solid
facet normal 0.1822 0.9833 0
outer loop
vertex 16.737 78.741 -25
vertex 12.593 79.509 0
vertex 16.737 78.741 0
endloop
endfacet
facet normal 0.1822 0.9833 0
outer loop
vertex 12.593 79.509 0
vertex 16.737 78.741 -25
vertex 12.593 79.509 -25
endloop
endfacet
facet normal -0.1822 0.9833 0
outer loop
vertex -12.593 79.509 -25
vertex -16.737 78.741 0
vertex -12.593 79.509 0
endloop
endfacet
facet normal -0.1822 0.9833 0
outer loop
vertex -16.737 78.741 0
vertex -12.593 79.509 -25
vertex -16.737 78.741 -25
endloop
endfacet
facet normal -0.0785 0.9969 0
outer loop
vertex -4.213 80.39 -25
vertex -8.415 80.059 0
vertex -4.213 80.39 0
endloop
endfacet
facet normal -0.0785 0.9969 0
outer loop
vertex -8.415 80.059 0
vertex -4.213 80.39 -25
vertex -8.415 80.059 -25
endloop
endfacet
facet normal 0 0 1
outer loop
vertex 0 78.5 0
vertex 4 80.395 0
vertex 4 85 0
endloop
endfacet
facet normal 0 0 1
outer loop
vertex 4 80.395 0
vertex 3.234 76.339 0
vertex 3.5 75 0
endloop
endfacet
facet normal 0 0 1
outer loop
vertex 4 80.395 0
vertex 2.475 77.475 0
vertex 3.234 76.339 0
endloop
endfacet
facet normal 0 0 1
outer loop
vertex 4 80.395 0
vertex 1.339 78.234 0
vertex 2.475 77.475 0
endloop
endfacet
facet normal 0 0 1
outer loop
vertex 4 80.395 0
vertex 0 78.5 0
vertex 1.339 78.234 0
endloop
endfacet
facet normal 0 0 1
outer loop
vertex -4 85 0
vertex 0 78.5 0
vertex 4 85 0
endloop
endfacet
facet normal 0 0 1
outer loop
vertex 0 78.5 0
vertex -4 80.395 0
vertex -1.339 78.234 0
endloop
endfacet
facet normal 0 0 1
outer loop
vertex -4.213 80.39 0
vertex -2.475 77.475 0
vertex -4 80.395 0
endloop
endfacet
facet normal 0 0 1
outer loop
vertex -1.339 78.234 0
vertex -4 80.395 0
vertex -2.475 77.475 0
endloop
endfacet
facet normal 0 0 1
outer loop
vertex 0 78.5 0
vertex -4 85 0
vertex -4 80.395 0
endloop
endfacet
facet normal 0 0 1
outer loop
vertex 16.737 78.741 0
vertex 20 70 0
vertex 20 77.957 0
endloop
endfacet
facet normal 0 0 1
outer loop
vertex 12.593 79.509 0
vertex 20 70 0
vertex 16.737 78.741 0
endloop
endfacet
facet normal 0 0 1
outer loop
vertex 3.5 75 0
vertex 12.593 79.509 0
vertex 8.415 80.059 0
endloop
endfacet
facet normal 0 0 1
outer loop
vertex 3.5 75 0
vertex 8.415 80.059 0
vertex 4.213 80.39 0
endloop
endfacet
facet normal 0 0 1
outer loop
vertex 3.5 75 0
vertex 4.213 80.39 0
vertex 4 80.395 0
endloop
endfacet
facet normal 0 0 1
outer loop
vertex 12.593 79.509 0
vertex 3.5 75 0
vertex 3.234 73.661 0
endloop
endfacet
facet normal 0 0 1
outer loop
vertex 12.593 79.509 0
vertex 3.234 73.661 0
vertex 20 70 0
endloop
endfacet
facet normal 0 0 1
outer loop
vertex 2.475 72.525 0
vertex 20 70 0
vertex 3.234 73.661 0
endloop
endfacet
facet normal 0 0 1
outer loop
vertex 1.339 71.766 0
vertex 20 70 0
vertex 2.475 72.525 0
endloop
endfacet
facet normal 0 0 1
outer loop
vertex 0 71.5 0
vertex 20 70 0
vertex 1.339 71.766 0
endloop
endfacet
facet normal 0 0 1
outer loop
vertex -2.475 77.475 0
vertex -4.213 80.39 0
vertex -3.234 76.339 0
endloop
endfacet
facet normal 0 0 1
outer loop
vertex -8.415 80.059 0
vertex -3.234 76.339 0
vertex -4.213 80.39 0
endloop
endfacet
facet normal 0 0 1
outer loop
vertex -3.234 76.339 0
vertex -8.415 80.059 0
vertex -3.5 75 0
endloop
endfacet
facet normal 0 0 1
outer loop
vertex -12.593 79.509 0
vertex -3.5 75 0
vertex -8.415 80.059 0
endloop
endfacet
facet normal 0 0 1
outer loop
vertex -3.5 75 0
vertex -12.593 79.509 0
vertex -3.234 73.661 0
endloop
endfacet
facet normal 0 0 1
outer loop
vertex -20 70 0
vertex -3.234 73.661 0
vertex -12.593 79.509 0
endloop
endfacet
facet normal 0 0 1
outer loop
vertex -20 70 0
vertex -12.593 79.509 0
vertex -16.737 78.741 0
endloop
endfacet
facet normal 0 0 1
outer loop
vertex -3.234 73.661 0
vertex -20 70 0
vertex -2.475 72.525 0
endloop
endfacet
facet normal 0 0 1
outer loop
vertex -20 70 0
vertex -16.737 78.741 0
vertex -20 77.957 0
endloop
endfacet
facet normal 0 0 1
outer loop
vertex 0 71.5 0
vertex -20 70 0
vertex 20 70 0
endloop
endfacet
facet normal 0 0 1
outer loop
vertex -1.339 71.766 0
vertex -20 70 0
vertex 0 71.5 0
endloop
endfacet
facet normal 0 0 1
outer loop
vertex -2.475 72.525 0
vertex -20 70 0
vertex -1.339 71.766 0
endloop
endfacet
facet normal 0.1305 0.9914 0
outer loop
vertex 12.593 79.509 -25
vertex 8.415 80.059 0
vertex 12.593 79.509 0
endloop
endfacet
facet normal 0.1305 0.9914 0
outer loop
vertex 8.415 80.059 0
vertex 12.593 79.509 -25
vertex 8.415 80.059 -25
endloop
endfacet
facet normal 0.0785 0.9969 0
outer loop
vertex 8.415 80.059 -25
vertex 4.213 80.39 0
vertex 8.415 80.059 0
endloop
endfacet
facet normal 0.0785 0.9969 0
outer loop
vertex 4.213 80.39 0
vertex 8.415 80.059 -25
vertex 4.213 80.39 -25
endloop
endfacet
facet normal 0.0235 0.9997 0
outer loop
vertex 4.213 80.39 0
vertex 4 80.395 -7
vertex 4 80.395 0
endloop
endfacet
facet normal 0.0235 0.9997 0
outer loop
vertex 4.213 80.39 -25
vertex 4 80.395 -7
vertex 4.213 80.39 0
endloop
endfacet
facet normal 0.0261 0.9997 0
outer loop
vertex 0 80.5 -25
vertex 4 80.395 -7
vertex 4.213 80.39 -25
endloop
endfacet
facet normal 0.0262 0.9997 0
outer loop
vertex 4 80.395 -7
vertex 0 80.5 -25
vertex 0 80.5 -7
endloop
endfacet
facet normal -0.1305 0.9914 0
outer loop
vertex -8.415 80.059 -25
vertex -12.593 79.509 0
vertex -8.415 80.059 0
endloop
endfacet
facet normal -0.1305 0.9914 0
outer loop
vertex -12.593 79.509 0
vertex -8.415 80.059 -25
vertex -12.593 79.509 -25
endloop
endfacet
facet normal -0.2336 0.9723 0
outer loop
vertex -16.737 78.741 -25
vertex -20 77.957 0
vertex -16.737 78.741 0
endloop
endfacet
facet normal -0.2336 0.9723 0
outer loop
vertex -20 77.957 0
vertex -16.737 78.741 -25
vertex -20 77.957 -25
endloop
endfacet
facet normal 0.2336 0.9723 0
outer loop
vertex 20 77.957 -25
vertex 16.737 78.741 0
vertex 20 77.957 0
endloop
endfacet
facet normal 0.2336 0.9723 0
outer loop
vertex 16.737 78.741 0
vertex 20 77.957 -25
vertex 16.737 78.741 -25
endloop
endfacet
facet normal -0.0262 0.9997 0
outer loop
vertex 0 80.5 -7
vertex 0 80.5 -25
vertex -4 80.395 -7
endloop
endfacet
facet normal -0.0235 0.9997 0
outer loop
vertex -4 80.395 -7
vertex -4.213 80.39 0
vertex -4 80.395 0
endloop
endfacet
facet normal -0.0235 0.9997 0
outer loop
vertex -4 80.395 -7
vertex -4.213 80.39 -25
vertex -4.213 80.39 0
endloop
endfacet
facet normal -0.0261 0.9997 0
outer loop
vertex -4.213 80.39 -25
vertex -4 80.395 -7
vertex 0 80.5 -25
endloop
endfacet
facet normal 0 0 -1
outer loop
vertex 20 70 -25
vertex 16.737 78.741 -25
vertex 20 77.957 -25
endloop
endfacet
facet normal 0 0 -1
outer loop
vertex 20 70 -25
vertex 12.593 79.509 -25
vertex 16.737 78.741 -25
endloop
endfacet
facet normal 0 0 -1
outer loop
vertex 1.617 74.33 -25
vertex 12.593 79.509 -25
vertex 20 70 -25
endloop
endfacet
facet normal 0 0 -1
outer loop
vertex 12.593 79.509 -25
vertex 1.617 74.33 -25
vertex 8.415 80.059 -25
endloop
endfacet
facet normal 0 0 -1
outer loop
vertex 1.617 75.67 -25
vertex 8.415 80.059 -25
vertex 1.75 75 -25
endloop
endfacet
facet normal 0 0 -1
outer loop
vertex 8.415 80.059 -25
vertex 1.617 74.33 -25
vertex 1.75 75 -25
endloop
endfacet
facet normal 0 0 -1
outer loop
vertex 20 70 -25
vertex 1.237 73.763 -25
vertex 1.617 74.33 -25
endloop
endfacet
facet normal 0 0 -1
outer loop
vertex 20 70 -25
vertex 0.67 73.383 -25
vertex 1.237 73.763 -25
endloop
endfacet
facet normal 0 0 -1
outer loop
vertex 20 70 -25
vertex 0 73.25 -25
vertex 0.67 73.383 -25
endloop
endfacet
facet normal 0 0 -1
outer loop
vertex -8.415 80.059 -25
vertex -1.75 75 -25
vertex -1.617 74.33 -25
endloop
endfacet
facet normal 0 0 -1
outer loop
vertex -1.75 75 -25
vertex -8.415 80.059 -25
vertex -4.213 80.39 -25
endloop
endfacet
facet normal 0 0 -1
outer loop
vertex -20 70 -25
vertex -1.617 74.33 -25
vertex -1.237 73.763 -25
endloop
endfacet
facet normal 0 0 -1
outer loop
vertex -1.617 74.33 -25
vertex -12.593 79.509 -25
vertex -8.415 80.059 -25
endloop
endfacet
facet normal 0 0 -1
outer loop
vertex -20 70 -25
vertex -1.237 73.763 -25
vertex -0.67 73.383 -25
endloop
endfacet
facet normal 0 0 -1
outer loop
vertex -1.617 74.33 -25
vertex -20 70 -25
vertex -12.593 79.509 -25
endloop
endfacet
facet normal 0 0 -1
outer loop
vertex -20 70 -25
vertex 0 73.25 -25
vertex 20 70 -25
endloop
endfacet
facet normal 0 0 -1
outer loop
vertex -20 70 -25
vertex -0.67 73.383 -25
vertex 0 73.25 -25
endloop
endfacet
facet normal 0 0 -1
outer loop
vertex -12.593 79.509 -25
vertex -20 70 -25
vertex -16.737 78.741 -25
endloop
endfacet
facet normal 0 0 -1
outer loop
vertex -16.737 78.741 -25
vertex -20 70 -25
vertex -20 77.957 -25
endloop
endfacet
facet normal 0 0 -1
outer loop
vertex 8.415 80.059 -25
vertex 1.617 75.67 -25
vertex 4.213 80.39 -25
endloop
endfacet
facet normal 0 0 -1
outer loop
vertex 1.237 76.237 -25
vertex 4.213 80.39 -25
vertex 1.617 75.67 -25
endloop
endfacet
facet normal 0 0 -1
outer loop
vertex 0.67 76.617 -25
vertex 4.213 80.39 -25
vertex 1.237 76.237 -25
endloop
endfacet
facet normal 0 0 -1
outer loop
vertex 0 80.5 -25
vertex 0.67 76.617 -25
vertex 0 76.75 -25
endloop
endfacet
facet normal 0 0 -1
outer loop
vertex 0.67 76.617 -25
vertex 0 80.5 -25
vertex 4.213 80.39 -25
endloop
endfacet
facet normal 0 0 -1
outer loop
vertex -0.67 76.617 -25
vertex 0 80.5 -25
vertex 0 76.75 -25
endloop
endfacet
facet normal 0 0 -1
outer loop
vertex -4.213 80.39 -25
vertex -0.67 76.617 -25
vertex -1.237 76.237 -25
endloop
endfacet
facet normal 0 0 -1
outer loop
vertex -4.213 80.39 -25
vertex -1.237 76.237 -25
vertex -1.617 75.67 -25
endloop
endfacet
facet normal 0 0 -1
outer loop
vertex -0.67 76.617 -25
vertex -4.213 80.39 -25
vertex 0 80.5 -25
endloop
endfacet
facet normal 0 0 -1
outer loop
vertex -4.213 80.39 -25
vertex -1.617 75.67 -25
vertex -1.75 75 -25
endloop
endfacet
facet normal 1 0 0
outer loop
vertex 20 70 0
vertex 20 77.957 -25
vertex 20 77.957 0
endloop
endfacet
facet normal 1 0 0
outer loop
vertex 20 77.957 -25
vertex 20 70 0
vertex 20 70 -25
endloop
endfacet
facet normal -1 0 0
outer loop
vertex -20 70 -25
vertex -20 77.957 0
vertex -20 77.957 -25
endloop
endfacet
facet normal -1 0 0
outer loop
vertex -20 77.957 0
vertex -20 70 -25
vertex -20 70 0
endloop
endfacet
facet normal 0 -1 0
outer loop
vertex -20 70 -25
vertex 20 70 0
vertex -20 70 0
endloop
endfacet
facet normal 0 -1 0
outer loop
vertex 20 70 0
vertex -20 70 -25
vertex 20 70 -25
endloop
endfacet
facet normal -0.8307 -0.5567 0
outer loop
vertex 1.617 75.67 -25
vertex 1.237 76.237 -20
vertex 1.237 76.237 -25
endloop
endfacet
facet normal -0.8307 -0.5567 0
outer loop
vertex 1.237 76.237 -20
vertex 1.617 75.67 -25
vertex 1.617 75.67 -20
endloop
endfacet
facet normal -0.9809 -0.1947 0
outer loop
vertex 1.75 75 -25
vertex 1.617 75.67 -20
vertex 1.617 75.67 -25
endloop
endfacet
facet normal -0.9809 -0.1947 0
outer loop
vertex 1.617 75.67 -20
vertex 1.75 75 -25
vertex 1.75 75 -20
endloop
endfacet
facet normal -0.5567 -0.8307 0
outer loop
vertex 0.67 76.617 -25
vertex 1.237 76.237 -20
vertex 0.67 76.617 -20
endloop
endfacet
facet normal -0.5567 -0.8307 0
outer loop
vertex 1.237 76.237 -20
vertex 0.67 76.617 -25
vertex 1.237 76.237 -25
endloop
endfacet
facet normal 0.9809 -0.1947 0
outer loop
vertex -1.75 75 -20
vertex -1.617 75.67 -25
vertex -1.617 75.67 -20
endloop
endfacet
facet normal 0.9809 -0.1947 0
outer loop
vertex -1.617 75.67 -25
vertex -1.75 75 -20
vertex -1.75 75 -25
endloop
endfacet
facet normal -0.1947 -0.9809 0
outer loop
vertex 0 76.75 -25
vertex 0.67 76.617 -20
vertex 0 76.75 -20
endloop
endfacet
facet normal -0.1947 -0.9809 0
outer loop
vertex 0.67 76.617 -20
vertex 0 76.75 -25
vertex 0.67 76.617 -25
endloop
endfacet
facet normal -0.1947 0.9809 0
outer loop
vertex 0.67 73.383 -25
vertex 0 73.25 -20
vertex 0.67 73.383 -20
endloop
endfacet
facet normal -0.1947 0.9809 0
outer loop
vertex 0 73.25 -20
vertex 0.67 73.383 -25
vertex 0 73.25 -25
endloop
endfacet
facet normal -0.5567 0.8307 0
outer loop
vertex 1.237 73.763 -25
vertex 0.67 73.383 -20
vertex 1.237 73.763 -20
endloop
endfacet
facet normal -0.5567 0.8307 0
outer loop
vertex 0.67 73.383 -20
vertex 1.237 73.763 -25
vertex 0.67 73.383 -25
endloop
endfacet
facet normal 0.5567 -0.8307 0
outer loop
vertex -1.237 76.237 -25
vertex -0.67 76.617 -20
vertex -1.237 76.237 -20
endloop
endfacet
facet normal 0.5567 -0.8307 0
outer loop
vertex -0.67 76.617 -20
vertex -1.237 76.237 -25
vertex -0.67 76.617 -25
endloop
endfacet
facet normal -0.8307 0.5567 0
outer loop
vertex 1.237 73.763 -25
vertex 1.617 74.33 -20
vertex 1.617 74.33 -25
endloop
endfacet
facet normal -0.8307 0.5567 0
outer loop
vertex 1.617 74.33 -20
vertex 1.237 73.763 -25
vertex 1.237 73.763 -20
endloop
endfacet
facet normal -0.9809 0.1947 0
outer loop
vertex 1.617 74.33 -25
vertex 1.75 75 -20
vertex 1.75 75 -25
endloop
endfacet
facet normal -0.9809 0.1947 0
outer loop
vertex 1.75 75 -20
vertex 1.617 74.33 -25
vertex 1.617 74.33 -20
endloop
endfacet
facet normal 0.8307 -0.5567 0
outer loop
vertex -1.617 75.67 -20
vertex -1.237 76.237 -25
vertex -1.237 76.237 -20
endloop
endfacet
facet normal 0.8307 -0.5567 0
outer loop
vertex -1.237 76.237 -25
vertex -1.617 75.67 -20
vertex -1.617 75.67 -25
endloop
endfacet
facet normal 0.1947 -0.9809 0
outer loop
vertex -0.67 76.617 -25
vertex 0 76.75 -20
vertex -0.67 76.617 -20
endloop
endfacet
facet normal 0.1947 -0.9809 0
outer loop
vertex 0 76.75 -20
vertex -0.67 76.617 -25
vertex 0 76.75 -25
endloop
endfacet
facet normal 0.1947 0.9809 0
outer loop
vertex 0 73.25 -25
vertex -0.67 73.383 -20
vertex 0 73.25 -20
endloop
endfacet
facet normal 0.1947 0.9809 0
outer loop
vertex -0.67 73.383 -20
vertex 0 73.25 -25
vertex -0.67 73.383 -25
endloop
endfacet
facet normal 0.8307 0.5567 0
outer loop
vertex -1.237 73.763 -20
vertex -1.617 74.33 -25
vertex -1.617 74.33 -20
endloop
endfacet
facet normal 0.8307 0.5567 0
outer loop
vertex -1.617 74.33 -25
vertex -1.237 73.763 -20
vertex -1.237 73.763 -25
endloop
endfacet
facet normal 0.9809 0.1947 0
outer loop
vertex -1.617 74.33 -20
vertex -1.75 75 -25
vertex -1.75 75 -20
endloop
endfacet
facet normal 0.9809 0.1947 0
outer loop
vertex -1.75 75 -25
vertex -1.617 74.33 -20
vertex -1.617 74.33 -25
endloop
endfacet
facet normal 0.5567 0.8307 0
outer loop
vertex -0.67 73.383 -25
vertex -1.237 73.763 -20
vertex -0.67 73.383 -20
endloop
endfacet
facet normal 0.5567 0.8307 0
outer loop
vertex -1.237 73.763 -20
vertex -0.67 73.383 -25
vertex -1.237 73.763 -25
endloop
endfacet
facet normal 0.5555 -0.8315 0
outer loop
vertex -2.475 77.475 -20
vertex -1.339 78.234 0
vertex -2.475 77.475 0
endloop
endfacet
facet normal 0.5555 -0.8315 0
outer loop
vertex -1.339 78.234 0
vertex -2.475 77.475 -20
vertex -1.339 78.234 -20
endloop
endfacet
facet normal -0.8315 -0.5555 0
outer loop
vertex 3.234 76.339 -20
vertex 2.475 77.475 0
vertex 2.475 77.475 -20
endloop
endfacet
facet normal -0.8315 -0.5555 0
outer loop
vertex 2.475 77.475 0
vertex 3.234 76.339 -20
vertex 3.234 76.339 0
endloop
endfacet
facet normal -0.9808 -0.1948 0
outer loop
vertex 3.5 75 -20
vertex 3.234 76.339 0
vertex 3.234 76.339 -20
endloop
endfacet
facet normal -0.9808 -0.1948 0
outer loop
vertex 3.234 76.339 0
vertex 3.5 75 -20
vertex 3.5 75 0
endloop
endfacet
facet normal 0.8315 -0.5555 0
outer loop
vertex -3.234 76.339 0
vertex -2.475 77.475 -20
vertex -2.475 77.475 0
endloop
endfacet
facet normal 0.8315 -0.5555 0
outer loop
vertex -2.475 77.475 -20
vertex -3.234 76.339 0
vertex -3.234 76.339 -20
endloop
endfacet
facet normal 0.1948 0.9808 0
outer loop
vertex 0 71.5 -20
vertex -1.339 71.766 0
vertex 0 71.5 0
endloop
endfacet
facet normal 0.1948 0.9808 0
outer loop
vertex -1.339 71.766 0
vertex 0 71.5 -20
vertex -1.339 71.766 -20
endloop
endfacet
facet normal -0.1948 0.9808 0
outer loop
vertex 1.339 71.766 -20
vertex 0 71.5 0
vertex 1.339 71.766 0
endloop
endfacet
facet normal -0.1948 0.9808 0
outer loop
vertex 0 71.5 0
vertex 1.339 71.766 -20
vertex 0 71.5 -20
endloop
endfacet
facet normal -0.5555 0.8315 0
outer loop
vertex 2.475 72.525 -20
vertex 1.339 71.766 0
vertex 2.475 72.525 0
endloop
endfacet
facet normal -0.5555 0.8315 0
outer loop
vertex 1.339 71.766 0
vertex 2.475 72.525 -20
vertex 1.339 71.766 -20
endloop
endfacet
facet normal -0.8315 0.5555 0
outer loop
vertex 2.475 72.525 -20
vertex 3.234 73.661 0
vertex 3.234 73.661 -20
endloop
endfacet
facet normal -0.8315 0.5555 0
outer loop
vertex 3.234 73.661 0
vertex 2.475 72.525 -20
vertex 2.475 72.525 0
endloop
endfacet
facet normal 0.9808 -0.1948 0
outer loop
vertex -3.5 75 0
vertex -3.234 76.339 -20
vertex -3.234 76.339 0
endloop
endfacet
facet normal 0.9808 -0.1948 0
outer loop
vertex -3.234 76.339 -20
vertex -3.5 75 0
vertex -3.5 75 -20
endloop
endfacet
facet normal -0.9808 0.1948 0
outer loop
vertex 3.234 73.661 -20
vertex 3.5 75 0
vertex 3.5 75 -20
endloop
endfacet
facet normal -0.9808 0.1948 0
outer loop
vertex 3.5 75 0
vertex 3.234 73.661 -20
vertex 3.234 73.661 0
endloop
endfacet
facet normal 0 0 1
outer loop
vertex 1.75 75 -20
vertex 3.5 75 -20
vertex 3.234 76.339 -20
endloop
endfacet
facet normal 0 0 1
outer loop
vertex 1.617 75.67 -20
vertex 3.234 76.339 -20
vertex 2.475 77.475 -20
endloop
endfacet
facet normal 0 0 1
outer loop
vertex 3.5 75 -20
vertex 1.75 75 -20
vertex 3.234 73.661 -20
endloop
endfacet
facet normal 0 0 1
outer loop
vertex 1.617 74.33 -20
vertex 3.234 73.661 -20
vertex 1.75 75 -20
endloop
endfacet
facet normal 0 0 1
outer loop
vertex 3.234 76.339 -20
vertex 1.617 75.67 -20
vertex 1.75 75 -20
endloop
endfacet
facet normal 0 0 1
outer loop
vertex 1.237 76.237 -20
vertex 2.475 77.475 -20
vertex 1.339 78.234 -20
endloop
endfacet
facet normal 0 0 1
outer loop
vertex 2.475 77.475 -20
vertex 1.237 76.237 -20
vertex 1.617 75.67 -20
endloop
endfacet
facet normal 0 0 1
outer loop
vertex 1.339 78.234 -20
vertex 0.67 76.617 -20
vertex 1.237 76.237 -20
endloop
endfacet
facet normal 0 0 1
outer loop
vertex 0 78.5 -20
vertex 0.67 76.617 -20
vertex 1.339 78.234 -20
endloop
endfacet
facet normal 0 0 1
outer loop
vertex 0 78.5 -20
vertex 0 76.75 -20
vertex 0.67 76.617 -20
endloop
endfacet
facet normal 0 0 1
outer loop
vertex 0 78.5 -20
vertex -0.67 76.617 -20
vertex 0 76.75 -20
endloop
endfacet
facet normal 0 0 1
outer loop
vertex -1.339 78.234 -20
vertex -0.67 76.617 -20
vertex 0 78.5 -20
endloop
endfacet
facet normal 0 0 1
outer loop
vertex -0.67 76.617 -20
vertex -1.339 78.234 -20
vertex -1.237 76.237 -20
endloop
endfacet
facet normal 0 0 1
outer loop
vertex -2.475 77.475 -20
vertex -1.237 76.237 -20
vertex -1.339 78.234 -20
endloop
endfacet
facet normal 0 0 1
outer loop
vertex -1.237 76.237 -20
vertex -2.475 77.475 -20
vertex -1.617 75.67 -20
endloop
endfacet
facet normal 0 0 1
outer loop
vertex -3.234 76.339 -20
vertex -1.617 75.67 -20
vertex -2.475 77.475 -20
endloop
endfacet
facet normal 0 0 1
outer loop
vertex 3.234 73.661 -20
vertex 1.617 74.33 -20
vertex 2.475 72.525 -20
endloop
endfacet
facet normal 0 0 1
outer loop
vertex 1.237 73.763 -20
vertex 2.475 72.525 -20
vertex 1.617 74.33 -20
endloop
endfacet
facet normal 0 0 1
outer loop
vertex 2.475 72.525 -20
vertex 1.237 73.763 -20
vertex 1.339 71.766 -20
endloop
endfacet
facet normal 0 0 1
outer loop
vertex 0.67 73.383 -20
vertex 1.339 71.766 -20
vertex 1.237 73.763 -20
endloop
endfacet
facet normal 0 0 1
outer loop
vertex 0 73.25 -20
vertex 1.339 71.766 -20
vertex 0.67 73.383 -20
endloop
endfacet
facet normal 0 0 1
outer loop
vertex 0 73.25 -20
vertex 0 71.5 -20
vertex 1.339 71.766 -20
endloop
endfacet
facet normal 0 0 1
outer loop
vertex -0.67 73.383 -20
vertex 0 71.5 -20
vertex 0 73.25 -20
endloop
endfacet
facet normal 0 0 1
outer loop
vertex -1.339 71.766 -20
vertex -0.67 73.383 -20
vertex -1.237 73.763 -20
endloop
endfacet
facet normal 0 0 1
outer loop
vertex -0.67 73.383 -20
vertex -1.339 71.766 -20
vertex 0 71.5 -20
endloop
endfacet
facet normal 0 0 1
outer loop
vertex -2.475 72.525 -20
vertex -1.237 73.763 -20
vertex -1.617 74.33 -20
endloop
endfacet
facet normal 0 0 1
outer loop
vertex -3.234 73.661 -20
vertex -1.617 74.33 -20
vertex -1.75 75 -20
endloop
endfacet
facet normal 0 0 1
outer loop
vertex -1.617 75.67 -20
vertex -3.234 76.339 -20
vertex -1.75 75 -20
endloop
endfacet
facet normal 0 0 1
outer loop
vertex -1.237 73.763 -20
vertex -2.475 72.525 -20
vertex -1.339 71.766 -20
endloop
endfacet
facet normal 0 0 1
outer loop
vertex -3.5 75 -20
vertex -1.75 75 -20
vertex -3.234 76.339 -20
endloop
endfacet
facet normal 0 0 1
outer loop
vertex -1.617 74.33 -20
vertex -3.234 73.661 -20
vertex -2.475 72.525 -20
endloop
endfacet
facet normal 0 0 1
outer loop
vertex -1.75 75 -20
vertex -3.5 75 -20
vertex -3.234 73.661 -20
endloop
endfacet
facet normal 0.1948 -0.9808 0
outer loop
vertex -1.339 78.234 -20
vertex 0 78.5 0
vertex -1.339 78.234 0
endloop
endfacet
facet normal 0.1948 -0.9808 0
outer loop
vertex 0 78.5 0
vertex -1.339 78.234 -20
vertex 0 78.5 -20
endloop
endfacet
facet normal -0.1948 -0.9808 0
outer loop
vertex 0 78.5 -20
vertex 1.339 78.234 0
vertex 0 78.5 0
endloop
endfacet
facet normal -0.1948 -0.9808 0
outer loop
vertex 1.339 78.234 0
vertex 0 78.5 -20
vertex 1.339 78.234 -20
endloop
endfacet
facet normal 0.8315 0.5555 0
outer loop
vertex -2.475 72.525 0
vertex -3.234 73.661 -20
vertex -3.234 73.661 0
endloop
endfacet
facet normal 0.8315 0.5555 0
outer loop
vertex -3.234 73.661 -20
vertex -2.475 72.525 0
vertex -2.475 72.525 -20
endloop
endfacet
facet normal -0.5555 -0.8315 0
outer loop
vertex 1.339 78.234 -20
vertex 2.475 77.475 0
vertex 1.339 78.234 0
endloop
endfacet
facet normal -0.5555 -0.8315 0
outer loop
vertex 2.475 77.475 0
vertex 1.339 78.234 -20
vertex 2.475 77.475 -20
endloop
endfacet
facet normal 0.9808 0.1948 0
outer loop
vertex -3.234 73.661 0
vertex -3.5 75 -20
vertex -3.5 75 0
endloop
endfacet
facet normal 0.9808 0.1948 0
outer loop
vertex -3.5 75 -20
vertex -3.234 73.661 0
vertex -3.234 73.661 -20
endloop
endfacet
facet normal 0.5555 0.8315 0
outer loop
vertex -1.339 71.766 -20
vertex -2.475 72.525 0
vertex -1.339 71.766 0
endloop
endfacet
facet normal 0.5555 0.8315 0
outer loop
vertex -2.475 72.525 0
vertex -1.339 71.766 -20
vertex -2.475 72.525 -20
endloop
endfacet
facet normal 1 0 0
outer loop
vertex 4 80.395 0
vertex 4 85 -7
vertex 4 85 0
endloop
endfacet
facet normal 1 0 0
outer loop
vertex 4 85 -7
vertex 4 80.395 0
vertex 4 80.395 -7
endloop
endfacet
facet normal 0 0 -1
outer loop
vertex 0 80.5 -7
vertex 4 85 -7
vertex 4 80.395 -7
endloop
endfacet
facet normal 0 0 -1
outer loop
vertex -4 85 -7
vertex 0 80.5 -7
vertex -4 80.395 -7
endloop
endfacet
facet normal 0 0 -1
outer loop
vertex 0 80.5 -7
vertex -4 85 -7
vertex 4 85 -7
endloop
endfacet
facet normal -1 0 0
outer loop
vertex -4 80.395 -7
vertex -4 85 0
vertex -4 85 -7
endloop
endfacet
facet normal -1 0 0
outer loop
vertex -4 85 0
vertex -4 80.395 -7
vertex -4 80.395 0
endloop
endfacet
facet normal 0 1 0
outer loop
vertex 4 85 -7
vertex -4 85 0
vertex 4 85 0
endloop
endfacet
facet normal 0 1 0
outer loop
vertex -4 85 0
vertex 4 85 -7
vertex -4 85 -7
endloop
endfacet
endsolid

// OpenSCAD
include <../../lib/relativity.scad/relativity.scad>

h_top = 5;
h_bottom = 8;

$fn=16;

module A() {
  difference() {
    intersected("not(box)", "box") {
      rod(d=161, h=25, anchor=top, $fn=120);
      translated(70*y) 
        box([40, 11, 50], anchor=-y, $class="box");
    }
    translated(75*y) {
      rod(d=3.5, h=50);
      rod(d=7, h=20, anchor=top);
    }
  }

  translated(80*y) 
  box([8, 5, 7], anchor=-y+z);
}


module B() {
  intersected("not(box)", "box") {
    rod(d=169, h=h_top, anchor=bottom);
    rod(d=169, h=h_bottom, anchor=top);
    rod(d=175, h=h_bottom-1.5, anchor=top);
    translated(77*y) box([47, 15, 20], anchor=-y, $class="box");
  }
  translated(77*y) 
  differed("hole", "not(hole)")
  box([47, 2, 8], anchor=y+z) {
    mirrored(x)
      align(x-y+z)
      box([14, 12, 15], anchor=x+y+z)
        rod(d=3.5, h=20, $class="hole");
    align(-y+z) {
      box([14, 12, 15], anchor=y+z)
        rod(d=3.5, h=20, $class="hole")
        align(top)
        rod(d=6.1, h=10, $fn=6, anchor=top, $class="hole");
      box([47, 12, 5], anchor=y+z);
    }
  }
  
}

A();
